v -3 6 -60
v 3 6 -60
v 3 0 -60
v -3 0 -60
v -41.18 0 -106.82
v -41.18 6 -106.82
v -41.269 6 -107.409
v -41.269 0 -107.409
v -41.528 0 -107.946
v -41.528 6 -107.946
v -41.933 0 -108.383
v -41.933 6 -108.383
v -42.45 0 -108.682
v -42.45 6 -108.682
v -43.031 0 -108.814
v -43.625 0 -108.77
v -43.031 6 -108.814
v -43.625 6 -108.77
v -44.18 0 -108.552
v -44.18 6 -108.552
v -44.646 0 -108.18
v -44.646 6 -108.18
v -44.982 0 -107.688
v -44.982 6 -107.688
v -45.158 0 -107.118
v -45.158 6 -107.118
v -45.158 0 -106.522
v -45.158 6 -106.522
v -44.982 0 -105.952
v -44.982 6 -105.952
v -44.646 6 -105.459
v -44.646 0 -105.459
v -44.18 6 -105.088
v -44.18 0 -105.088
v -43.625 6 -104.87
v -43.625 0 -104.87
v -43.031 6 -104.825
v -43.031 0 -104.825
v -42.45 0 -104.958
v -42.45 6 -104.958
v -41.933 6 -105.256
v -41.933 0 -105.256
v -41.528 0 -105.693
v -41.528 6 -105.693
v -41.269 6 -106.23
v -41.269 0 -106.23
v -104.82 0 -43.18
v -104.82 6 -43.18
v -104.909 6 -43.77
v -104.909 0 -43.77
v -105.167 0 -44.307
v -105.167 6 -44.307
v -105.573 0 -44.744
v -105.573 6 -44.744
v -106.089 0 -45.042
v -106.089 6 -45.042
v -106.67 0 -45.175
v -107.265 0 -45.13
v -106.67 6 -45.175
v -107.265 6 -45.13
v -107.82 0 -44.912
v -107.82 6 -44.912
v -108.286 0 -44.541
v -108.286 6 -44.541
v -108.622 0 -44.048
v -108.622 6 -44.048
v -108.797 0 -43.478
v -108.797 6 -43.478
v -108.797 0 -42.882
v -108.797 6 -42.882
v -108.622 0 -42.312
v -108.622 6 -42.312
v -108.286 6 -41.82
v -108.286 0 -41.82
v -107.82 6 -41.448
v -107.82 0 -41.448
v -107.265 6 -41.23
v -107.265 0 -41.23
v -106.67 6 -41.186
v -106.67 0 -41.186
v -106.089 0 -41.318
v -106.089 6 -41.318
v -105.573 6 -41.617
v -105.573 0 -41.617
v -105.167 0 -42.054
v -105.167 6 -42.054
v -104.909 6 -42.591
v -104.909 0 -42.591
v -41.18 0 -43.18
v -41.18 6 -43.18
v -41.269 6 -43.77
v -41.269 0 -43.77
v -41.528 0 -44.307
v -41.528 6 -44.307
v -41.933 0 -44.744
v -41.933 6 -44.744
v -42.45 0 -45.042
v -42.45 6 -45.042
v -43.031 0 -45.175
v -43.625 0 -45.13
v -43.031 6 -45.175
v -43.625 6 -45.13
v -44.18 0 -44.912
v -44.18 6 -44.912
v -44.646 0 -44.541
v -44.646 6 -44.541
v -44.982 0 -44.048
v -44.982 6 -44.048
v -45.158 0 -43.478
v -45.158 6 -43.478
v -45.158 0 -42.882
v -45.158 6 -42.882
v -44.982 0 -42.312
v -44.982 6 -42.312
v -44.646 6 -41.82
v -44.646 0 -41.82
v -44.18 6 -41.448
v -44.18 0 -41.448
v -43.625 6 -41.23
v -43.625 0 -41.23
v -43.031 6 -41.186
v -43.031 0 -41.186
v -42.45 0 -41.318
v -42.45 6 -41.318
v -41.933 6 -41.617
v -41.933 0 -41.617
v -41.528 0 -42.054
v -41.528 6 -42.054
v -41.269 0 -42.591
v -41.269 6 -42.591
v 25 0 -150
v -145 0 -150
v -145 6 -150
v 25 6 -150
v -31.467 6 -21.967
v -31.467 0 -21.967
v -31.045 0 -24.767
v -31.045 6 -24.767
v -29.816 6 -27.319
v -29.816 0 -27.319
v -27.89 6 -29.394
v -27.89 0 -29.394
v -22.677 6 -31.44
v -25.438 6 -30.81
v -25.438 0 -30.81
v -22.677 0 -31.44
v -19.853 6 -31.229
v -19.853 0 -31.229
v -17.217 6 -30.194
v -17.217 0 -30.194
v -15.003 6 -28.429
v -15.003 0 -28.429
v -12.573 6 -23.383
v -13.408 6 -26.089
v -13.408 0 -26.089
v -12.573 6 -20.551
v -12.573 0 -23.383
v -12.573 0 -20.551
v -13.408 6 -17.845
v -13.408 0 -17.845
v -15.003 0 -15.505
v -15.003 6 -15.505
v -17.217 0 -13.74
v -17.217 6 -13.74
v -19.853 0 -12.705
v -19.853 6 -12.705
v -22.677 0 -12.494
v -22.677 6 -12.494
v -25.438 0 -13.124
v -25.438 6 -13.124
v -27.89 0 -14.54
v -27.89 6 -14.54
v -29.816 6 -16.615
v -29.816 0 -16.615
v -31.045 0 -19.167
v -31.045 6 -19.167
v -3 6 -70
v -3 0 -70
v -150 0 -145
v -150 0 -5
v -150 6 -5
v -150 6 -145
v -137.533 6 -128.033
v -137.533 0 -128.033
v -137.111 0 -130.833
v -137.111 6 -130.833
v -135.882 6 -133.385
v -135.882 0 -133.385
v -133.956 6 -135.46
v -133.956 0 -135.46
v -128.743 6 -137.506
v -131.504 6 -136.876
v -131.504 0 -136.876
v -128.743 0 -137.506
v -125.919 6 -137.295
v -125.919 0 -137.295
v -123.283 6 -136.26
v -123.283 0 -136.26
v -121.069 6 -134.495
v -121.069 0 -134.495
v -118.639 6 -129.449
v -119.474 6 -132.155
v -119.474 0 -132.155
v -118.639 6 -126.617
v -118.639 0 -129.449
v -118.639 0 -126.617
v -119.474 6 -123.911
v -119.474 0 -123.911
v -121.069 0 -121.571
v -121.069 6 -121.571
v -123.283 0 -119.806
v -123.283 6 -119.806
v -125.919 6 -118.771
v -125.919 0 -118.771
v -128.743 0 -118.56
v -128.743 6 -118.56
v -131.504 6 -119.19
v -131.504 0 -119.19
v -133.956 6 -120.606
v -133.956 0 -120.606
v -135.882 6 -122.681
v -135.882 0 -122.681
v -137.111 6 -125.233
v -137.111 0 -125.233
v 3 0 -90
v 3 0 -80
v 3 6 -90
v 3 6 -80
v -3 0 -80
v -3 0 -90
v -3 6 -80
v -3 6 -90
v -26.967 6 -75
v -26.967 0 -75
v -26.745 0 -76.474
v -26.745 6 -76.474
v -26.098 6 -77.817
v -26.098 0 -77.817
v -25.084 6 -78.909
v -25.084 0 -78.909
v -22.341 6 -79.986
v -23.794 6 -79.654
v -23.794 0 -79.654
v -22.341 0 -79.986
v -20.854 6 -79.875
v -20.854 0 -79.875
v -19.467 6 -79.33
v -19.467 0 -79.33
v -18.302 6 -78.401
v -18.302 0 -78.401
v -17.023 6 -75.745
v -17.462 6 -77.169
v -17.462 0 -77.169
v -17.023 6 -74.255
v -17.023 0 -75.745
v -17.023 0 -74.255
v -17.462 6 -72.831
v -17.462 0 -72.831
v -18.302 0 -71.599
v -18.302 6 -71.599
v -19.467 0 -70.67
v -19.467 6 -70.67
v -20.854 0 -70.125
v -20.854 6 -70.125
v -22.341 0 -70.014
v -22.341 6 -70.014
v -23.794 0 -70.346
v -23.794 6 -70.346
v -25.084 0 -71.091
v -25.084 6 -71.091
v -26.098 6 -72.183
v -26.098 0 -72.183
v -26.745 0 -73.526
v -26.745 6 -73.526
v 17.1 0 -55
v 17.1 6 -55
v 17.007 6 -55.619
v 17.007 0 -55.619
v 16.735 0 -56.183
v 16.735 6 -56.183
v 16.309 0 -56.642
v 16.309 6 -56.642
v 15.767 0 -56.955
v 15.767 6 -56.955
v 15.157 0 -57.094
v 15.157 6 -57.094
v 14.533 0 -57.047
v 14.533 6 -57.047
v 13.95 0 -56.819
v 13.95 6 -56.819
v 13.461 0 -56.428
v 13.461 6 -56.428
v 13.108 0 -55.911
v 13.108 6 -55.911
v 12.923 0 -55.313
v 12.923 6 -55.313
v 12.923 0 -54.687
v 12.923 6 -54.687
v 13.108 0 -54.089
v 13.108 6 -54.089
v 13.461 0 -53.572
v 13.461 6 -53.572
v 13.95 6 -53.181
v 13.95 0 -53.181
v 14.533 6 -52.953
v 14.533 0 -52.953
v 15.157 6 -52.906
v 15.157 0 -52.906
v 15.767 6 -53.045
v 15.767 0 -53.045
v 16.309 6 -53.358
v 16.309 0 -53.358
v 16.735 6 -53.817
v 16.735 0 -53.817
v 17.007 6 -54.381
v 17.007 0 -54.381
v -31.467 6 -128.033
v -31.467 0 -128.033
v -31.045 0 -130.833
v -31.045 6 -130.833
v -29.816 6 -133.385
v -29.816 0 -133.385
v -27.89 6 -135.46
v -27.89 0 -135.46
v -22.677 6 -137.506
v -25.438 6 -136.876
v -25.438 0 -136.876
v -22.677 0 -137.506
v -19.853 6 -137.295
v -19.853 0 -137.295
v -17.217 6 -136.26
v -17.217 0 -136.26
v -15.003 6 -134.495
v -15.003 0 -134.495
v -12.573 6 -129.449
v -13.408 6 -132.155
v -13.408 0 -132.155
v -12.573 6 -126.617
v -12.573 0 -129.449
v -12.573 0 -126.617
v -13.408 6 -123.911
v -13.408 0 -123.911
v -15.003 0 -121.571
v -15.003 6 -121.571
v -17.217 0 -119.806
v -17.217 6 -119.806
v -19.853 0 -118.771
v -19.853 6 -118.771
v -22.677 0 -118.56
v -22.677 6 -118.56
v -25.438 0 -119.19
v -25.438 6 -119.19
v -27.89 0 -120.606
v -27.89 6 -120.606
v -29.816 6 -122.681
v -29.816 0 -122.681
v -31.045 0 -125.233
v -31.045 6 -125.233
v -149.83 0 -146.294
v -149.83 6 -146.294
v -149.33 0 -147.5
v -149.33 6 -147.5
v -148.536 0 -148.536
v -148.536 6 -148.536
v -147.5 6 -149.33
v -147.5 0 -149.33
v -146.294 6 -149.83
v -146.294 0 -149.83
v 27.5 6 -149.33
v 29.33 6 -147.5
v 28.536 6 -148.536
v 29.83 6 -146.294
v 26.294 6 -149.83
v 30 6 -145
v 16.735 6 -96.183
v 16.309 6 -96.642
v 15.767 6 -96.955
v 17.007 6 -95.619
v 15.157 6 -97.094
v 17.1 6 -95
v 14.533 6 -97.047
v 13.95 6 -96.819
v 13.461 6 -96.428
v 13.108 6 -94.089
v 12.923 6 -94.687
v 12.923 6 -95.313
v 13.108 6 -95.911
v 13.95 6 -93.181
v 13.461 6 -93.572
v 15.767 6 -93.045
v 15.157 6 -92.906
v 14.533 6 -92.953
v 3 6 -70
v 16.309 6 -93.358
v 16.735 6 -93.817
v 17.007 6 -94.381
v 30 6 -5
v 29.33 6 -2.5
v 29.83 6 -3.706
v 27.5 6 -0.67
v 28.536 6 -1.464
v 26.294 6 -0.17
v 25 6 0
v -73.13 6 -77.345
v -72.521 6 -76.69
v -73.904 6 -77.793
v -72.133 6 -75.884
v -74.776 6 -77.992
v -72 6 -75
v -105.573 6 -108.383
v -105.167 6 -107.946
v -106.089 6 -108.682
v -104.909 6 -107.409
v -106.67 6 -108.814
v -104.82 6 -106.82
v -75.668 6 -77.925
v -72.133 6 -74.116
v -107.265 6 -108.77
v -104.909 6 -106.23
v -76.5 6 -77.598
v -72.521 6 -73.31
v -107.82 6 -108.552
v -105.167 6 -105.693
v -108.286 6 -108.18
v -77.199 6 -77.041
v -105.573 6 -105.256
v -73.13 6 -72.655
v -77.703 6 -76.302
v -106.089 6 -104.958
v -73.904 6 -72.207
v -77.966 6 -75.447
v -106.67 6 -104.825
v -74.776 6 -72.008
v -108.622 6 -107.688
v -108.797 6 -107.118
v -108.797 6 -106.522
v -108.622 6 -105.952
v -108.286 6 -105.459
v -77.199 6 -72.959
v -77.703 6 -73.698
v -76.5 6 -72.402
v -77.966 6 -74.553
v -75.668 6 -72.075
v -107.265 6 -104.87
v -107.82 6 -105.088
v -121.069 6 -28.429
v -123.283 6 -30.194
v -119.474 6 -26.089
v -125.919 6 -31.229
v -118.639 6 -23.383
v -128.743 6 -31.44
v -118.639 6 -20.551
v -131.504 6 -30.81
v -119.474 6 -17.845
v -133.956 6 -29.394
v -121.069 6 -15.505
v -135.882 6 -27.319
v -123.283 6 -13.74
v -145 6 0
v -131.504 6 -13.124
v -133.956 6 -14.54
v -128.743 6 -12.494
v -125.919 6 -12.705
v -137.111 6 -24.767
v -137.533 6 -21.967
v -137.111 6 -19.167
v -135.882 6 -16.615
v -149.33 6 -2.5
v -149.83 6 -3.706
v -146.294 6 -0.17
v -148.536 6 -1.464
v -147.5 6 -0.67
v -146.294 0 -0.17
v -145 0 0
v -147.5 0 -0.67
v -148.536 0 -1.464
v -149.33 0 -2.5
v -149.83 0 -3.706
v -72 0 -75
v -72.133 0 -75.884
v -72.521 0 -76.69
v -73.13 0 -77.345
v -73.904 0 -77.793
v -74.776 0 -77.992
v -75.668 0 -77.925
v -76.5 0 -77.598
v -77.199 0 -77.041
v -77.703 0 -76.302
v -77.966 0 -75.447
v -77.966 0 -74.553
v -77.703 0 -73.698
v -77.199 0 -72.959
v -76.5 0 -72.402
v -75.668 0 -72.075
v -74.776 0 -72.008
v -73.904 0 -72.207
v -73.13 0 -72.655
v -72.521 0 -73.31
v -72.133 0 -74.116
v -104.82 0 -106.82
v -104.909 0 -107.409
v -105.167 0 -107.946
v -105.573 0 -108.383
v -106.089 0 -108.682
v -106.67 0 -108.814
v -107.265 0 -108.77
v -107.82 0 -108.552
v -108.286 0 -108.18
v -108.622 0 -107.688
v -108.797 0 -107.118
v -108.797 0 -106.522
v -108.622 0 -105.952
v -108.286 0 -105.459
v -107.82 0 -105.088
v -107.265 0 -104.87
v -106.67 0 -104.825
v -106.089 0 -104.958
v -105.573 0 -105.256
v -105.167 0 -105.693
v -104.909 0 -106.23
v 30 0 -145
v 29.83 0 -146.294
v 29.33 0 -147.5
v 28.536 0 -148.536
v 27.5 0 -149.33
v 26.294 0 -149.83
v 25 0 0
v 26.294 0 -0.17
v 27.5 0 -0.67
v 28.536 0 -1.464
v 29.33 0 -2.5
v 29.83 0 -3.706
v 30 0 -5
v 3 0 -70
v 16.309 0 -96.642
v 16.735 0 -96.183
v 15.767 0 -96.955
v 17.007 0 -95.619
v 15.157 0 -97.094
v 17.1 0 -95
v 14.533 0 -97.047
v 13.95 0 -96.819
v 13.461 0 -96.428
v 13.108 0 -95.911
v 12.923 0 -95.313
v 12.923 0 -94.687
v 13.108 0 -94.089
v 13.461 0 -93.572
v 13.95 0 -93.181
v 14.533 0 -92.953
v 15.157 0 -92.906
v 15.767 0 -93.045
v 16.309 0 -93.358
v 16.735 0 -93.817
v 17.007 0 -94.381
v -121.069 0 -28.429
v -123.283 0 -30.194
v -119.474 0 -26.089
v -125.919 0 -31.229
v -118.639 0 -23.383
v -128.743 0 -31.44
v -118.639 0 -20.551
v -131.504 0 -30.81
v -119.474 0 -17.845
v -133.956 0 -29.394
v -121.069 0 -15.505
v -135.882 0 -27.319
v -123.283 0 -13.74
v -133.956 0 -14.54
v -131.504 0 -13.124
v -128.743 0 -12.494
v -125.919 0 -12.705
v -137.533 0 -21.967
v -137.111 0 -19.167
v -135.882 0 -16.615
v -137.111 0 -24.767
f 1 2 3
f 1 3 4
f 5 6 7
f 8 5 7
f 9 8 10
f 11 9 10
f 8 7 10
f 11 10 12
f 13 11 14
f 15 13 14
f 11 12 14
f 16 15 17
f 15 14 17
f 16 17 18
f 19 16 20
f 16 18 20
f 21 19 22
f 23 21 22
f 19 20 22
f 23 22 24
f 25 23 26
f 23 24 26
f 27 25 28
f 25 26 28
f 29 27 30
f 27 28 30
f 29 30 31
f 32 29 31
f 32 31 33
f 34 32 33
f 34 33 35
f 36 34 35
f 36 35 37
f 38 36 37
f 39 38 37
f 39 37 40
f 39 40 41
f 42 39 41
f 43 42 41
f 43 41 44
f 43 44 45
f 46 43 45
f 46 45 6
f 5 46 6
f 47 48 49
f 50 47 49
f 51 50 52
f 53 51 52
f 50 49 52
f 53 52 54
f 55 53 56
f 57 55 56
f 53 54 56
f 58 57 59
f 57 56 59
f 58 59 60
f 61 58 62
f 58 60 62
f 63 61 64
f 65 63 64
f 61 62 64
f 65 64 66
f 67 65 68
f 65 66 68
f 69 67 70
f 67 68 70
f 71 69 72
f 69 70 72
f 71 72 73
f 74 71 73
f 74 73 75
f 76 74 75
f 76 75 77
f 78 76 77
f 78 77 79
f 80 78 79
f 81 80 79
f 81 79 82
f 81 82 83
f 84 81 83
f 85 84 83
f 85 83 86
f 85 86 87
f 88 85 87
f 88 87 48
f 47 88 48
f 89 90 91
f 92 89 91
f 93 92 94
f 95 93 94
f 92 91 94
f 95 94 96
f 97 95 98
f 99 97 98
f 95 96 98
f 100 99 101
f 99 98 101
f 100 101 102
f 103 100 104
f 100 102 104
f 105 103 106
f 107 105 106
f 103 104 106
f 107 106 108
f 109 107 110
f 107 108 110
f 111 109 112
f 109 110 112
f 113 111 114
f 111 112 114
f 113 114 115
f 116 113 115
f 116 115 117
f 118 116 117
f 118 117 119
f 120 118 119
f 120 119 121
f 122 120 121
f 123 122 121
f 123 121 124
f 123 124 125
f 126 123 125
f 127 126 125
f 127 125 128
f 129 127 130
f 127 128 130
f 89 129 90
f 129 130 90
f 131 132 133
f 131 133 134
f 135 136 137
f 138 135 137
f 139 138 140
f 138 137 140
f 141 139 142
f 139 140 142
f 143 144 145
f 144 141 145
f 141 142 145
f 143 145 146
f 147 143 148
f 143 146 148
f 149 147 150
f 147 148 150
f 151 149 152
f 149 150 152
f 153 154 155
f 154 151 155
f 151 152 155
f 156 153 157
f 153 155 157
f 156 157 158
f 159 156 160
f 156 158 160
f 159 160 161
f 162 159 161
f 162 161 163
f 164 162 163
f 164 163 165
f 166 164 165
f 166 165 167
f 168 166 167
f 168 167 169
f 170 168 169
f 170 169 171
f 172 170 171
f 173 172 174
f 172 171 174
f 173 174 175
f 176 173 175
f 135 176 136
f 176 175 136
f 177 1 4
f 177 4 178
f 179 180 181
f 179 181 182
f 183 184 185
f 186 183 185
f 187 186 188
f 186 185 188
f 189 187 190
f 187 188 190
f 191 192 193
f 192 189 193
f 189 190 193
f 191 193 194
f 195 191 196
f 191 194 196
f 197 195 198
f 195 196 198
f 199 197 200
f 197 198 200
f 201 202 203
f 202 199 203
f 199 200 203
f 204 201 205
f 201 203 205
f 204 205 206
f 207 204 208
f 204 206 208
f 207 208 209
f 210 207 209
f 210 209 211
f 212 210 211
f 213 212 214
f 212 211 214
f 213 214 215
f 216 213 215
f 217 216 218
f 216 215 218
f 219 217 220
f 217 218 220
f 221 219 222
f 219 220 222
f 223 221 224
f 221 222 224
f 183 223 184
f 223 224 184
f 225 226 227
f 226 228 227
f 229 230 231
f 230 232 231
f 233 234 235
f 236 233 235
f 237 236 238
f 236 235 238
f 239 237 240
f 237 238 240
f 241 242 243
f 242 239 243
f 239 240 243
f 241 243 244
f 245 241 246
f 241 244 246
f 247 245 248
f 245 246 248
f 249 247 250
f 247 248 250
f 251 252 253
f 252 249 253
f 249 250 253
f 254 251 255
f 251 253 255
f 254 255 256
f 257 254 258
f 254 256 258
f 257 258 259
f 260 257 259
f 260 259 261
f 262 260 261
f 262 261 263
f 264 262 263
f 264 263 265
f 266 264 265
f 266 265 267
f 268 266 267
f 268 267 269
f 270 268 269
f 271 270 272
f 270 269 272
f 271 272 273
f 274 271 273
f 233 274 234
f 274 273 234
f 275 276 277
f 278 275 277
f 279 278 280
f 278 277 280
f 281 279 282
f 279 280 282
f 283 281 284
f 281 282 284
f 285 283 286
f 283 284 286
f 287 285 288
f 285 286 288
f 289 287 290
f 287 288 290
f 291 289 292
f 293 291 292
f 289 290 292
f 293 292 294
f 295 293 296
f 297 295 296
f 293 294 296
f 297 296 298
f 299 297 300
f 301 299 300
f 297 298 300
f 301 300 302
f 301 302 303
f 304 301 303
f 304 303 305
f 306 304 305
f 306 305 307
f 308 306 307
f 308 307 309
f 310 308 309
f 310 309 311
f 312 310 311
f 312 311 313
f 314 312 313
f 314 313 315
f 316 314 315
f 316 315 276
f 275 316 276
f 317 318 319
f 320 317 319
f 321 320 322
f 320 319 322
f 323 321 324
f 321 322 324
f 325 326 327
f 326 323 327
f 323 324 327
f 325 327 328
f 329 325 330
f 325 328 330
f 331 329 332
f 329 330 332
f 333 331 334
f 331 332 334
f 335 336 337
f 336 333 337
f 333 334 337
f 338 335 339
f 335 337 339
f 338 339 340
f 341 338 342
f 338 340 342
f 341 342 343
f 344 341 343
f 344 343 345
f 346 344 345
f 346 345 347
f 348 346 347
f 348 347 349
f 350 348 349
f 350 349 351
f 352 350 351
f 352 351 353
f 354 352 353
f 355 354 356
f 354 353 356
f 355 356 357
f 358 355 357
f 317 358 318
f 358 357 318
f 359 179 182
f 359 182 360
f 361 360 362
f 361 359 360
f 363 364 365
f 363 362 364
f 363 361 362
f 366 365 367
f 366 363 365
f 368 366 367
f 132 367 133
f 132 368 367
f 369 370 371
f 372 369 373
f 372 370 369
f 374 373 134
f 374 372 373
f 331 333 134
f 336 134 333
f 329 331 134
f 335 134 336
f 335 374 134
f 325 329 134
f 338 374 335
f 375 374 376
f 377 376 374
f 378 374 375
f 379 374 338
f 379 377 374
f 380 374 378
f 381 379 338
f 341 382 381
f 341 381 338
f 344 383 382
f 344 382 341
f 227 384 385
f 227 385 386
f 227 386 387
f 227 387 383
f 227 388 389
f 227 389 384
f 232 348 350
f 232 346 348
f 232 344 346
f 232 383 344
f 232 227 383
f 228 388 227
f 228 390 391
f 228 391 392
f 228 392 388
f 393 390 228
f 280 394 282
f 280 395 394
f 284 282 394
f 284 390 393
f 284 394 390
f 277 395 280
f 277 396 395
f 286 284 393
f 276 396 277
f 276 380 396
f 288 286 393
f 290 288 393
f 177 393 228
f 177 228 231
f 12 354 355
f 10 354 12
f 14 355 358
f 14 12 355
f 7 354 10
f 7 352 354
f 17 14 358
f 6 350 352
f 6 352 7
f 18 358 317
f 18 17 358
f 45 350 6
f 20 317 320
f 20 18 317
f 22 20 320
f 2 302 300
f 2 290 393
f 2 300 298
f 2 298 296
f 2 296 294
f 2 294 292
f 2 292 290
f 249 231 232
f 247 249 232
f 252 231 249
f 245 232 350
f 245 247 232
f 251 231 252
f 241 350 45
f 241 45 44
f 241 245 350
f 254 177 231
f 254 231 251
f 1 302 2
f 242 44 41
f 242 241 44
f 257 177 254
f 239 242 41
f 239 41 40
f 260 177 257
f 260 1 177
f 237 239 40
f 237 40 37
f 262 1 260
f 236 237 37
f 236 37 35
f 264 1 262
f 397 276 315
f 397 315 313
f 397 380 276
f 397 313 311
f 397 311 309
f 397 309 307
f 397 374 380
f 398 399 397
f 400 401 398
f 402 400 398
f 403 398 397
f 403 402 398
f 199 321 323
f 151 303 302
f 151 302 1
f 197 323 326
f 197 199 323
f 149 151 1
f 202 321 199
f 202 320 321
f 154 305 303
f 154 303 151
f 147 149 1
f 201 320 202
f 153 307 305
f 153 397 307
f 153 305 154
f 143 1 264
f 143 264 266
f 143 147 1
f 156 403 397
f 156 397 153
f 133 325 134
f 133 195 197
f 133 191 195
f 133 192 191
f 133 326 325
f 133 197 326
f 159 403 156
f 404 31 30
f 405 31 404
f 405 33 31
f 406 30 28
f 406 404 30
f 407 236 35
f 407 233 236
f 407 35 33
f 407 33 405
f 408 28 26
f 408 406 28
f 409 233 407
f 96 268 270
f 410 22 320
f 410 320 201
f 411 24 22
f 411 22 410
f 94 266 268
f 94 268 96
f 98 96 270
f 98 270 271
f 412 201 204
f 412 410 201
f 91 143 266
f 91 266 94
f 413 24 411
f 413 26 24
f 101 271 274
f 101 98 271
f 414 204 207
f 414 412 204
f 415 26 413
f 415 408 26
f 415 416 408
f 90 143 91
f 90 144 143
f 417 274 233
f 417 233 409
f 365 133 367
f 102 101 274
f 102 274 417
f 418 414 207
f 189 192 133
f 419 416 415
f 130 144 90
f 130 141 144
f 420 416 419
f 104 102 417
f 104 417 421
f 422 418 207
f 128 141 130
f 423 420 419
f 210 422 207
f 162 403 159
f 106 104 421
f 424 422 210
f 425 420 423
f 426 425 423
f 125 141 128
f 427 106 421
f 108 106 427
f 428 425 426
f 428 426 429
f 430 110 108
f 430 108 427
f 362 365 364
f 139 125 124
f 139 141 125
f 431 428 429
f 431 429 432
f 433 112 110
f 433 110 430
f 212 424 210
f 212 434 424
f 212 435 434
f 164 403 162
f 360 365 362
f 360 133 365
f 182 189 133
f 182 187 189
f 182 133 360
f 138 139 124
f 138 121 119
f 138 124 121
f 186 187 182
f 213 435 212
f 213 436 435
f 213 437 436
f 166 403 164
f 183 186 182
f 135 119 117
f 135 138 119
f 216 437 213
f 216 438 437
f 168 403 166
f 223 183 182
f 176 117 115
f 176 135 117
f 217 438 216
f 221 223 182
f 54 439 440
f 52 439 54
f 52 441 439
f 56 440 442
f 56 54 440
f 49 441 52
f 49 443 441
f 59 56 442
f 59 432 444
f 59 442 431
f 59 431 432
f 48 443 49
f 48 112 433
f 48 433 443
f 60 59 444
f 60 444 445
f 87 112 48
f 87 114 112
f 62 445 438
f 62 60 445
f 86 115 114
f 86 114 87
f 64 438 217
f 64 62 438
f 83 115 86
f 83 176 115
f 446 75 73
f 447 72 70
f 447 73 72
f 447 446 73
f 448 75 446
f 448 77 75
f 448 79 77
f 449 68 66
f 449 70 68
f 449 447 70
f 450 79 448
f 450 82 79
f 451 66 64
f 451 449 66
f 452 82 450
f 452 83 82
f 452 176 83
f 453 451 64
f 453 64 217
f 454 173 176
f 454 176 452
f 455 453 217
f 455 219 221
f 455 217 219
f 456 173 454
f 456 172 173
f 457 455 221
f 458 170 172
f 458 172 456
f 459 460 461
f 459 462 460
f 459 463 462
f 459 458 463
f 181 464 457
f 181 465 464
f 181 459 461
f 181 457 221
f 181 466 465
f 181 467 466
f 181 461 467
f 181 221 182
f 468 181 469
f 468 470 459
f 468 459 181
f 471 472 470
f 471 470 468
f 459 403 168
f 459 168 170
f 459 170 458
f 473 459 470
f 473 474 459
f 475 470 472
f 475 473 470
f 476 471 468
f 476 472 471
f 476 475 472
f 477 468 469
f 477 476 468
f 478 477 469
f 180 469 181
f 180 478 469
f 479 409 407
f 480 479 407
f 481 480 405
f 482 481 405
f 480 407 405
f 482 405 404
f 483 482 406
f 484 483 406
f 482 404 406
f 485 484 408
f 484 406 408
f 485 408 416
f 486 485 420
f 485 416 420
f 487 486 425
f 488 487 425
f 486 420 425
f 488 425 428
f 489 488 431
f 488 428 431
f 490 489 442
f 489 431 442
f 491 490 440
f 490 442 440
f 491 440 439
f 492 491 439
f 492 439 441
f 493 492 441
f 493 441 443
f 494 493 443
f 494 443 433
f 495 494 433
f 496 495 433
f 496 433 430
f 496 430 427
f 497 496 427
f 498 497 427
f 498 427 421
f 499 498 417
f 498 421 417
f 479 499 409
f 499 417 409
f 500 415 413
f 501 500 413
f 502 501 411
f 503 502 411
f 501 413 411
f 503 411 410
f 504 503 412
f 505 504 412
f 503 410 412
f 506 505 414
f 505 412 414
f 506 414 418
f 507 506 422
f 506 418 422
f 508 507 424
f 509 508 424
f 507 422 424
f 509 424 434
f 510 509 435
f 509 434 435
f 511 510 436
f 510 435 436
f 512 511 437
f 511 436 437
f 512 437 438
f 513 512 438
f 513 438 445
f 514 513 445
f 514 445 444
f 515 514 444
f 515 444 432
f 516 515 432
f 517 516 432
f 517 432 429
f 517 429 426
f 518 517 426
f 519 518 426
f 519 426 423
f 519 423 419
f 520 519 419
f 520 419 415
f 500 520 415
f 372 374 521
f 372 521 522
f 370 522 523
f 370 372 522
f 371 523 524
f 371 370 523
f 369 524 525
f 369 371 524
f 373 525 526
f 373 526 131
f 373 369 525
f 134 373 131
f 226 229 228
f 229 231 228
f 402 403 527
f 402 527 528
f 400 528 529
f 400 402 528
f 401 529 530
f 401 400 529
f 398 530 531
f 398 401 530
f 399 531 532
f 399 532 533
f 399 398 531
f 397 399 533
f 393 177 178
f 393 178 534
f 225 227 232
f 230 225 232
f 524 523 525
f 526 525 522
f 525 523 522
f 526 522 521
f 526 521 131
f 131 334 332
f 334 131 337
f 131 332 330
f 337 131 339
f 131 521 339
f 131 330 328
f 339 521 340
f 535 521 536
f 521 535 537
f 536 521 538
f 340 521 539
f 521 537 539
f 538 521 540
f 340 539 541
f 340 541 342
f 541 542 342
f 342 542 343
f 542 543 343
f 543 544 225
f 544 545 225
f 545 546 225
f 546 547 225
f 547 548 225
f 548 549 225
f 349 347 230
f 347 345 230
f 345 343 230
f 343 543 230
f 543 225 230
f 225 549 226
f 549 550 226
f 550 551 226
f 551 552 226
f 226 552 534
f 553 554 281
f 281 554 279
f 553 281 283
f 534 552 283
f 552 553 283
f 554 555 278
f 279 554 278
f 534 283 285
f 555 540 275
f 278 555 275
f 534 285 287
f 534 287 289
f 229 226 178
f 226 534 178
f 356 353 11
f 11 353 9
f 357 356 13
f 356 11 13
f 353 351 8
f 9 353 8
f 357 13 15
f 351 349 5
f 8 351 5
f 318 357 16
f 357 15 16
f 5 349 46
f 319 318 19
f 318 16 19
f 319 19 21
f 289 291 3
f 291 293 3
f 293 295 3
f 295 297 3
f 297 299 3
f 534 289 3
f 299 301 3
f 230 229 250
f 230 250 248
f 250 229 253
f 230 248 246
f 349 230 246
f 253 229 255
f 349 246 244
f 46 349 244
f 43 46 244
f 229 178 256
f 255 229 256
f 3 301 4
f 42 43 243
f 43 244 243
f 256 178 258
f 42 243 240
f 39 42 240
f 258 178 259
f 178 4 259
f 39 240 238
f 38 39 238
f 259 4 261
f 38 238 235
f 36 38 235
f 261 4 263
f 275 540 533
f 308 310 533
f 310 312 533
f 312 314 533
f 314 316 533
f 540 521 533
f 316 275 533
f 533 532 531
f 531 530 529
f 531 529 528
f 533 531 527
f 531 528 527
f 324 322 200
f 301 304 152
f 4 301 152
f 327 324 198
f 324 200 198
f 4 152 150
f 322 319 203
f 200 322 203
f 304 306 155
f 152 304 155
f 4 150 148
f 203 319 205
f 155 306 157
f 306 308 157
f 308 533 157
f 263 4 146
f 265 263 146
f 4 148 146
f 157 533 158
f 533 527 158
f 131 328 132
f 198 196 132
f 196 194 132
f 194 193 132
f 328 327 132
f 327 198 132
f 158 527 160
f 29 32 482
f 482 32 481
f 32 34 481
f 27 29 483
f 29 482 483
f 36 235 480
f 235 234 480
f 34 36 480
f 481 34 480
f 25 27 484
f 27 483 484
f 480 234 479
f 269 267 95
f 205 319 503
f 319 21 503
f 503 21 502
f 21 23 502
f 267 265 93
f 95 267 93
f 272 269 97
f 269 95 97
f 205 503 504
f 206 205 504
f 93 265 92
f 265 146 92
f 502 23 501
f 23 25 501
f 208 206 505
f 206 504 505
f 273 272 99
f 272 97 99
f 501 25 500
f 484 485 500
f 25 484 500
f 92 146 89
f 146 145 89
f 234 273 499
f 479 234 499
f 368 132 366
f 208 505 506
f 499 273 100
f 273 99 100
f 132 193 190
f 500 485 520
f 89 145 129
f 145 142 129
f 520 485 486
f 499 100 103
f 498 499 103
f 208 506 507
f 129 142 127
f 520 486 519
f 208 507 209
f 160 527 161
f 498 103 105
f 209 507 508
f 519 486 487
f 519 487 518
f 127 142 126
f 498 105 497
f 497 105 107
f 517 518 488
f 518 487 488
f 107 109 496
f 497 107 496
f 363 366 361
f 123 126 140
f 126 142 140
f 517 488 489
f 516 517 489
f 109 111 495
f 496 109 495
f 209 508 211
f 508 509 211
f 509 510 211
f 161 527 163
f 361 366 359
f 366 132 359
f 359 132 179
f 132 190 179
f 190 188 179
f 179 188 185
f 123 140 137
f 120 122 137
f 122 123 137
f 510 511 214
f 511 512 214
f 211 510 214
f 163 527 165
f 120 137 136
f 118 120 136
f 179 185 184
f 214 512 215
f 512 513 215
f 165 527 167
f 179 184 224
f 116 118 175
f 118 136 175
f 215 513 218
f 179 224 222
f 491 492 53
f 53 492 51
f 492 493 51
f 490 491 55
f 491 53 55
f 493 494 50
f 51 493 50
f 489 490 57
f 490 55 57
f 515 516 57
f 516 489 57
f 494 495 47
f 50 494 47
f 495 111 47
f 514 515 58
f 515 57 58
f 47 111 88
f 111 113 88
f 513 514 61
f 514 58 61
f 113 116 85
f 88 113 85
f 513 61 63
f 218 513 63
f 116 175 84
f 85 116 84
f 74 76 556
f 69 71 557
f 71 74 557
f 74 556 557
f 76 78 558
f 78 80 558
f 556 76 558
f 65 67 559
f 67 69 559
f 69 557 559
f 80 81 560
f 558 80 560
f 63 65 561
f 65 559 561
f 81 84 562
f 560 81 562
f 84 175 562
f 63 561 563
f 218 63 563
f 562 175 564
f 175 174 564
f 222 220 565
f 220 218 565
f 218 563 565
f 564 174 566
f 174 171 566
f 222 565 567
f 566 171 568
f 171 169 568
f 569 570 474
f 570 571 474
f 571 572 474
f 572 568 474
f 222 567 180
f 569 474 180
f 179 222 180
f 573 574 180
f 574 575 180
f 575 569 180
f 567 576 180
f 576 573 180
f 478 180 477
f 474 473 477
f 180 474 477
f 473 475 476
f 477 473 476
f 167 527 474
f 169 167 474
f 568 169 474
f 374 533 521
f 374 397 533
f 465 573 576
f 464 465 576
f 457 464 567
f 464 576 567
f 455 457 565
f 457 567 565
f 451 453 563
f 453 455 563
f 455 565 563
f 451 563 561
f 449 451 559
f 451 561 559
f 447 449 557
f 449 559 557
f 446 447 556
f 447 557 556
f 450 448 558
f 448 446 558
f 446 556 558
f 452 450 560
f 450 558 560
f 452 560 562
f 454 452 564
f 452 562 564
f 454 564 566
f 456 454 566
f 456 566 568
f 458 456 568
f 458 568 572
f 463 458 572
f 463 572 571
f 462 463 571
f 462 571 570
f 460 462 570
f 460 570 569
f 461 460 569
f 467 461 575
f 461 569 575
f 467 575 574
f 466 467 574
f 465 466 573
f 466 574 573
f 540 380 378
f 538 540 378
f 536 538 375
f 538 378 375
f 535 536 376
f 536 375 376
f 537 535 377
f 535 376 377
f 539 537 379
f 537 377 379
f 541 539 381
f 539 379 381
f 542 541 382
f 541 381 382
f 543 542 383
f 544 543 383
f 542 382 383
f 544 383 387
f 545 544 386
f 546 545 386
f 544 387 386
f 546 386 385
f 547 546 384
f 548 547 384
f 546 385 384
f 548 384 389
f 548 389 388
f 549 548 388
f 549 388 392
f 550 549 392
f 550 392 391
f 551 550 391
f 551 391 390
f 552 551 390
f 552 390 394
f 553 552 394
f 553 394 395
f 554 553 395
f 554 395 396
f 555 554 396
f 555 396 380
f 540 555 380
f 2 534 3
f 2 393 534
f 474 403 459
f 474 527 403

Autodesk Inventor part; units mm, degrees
ref_plane "YZ Plane" through (0, 0, 0) normal (1, 0, 0) x (0, 1, 0)
ref_plane "XZ Plane" through (0, 0, 0) normal (0, 1, 0) x (-1, 0, 0)
ref_plane "XY Plane" through (0, 0, 0) normal (0, 0, 1) x (1, 0, 0)
sketch "Sketch1" plane through (0, 0, 0) normal (0, 1, 0) x (-1, 0, 0)
  line L0 (5, 0) -> (145, 0)
  line L1 (150, -5) -> (150, -145)
  line L2 (145, -150) -> (5, -150)
  line L3 (0, -145) -> (0, -5)
  arc A0 (150, -5) -> (145, 0) centre (145, -5) ccw
  arc A1 (150, -5) -> (145, 0) centre (145, -5) ccw
  arc A2 (145, -150) -> (150, -145) centre (145, -145) ccw
  arc A3 (5, 0) -> (0, -5) centre (5, -5) ccw
  arc A4 (0, -145) -> (5, -150) centre (5, -145) ccw
  circle A5 centre (128.033, -21.967) radius 9.5
  circle A6 centre (128.033, -128.033) radius 9.5
  circle A7 centre (21.967, -128.033) radius 9.5
  circle A8 centre (21.967, -21.967) radius 9.5
  circle A9 centre (21.967, -75) radius 5
  point P0 (150, -150)
  point P1 (150, 0)
  point P2 (0, -150)
  dimension "d12" = 150
  dimension "d13" = 150
  dimension "d22" = 5
  dimension "d23" = 5
  dimension "d28" = 19
  dimension "d29" = 19
  dimension "d30" = 19
  dimension "d31" = 19
  dimension "d32" = 10
extrude "Extrusion1" add sketch "Sketch1" along normal blind 6
sketch "Sketch2" plane through (0, 6, 0) normal (0, 1, 0) x (1, 0, 0)
  circle A0 centre (-128.033, 21.967) radius 9.5 projected
  circle A1 centre (-21.967, 128.033) radius 9.5 projected
  circle A2 centre (-128.033, 128.033) radius 9.5 projected
  circle A3 centre (-75, 75) radius 3
  circle A4 centre (-21.967, 21.967) radius 9.5 projected
  circle A5 centre (-106.8198, 43.1802) radius 2
  circle A6 centre (-43.1802, 43.1802) radius 2
  circle A7 centre (-43.1802, 106.8198) radius 2
  circle A8 centre (-106.8198, 106.8198) radius 2
  point P0 (0, 0)
  dimension "d35" = 6
  dimension "d40" = 4
  dimension "d41" = 4
  dimension "d42" = 4
  dimension "d43" = 4
  dimension "d47" = 30
extrude "Extrusion2" cut sketch "Sketch2" against normal blind 6 contours A3 | A5 | A6 | A7 | A8
sketch "Sketch3" plane through (0, 6, 0) normal (0, 1, 0) x (1, 0, 0)
  arc A0 (-5, 0) -> (0, 5) centre (-5, 5) ccw projected
  line L0 (-5, 0) -> (25, 0)
  line L1 (30, 5) -> (30, 145)
  line L2 (25, 150) -> (-5, 150)
  line L3 (-5, 150) -> (-5, 0)
  arc A1 (25, 0) -> (30, 5) centre (25, 5) ccw
  arc A2 (30, 145) -> (25, 150) centre (25, 145) ccw
  point P0 (0, 0)
  point P1 (30, 150)
  point P2 (30, 0)
  dimension "d48" = 35
  dimension "d49" = 150
  dimension "d50" = 5
extrude "Extrusion3" add sketch "Sketch3" against normal blind 6
sketch "Sketch4" plane through (0, 6, 0) normal (0, 1, 0) x (1, 0, 0)
  line L0 (30, 5) -> (30, 145) projected
  circle A0 centre (15, 55) radius 2.1
  circle A1 centre (15, 95) radius 2.1
  line L1 (-3, 80) -> (3, 80)
  line L2 (3, 80) -> (3, 90)
  line L3 (3, 90) -> (-3, 90)
  line L4 (-3, 90) -> (-3, 80)
  line L5 (-3, 70) -> (3, 70)
  line L6 (3, 70) -> (3, 60)
  line L7 (3, 60) -> (-3, 60)
  line L8 (-3, 60) -> (-3, 70)
  line L9 (15, 75) -> (15, 55)
  line L10 (15, 75) -> (15, 95)
  point P0 (0, 0)
  dimension "d55" = 4.2
  dimension "d56" = 4.2
  dimension "d58" = 10
  dimension "d60" = 6
  dimension "d61" = 10
  dimension "d62" = 6
  dimension "d63" = 10
  dimension "d67" = 20
  dimension "d68" = 20
extrude "Extrusion4" cut sketch "Sketch4" against normal blind 6
properties part number "E_base1"
